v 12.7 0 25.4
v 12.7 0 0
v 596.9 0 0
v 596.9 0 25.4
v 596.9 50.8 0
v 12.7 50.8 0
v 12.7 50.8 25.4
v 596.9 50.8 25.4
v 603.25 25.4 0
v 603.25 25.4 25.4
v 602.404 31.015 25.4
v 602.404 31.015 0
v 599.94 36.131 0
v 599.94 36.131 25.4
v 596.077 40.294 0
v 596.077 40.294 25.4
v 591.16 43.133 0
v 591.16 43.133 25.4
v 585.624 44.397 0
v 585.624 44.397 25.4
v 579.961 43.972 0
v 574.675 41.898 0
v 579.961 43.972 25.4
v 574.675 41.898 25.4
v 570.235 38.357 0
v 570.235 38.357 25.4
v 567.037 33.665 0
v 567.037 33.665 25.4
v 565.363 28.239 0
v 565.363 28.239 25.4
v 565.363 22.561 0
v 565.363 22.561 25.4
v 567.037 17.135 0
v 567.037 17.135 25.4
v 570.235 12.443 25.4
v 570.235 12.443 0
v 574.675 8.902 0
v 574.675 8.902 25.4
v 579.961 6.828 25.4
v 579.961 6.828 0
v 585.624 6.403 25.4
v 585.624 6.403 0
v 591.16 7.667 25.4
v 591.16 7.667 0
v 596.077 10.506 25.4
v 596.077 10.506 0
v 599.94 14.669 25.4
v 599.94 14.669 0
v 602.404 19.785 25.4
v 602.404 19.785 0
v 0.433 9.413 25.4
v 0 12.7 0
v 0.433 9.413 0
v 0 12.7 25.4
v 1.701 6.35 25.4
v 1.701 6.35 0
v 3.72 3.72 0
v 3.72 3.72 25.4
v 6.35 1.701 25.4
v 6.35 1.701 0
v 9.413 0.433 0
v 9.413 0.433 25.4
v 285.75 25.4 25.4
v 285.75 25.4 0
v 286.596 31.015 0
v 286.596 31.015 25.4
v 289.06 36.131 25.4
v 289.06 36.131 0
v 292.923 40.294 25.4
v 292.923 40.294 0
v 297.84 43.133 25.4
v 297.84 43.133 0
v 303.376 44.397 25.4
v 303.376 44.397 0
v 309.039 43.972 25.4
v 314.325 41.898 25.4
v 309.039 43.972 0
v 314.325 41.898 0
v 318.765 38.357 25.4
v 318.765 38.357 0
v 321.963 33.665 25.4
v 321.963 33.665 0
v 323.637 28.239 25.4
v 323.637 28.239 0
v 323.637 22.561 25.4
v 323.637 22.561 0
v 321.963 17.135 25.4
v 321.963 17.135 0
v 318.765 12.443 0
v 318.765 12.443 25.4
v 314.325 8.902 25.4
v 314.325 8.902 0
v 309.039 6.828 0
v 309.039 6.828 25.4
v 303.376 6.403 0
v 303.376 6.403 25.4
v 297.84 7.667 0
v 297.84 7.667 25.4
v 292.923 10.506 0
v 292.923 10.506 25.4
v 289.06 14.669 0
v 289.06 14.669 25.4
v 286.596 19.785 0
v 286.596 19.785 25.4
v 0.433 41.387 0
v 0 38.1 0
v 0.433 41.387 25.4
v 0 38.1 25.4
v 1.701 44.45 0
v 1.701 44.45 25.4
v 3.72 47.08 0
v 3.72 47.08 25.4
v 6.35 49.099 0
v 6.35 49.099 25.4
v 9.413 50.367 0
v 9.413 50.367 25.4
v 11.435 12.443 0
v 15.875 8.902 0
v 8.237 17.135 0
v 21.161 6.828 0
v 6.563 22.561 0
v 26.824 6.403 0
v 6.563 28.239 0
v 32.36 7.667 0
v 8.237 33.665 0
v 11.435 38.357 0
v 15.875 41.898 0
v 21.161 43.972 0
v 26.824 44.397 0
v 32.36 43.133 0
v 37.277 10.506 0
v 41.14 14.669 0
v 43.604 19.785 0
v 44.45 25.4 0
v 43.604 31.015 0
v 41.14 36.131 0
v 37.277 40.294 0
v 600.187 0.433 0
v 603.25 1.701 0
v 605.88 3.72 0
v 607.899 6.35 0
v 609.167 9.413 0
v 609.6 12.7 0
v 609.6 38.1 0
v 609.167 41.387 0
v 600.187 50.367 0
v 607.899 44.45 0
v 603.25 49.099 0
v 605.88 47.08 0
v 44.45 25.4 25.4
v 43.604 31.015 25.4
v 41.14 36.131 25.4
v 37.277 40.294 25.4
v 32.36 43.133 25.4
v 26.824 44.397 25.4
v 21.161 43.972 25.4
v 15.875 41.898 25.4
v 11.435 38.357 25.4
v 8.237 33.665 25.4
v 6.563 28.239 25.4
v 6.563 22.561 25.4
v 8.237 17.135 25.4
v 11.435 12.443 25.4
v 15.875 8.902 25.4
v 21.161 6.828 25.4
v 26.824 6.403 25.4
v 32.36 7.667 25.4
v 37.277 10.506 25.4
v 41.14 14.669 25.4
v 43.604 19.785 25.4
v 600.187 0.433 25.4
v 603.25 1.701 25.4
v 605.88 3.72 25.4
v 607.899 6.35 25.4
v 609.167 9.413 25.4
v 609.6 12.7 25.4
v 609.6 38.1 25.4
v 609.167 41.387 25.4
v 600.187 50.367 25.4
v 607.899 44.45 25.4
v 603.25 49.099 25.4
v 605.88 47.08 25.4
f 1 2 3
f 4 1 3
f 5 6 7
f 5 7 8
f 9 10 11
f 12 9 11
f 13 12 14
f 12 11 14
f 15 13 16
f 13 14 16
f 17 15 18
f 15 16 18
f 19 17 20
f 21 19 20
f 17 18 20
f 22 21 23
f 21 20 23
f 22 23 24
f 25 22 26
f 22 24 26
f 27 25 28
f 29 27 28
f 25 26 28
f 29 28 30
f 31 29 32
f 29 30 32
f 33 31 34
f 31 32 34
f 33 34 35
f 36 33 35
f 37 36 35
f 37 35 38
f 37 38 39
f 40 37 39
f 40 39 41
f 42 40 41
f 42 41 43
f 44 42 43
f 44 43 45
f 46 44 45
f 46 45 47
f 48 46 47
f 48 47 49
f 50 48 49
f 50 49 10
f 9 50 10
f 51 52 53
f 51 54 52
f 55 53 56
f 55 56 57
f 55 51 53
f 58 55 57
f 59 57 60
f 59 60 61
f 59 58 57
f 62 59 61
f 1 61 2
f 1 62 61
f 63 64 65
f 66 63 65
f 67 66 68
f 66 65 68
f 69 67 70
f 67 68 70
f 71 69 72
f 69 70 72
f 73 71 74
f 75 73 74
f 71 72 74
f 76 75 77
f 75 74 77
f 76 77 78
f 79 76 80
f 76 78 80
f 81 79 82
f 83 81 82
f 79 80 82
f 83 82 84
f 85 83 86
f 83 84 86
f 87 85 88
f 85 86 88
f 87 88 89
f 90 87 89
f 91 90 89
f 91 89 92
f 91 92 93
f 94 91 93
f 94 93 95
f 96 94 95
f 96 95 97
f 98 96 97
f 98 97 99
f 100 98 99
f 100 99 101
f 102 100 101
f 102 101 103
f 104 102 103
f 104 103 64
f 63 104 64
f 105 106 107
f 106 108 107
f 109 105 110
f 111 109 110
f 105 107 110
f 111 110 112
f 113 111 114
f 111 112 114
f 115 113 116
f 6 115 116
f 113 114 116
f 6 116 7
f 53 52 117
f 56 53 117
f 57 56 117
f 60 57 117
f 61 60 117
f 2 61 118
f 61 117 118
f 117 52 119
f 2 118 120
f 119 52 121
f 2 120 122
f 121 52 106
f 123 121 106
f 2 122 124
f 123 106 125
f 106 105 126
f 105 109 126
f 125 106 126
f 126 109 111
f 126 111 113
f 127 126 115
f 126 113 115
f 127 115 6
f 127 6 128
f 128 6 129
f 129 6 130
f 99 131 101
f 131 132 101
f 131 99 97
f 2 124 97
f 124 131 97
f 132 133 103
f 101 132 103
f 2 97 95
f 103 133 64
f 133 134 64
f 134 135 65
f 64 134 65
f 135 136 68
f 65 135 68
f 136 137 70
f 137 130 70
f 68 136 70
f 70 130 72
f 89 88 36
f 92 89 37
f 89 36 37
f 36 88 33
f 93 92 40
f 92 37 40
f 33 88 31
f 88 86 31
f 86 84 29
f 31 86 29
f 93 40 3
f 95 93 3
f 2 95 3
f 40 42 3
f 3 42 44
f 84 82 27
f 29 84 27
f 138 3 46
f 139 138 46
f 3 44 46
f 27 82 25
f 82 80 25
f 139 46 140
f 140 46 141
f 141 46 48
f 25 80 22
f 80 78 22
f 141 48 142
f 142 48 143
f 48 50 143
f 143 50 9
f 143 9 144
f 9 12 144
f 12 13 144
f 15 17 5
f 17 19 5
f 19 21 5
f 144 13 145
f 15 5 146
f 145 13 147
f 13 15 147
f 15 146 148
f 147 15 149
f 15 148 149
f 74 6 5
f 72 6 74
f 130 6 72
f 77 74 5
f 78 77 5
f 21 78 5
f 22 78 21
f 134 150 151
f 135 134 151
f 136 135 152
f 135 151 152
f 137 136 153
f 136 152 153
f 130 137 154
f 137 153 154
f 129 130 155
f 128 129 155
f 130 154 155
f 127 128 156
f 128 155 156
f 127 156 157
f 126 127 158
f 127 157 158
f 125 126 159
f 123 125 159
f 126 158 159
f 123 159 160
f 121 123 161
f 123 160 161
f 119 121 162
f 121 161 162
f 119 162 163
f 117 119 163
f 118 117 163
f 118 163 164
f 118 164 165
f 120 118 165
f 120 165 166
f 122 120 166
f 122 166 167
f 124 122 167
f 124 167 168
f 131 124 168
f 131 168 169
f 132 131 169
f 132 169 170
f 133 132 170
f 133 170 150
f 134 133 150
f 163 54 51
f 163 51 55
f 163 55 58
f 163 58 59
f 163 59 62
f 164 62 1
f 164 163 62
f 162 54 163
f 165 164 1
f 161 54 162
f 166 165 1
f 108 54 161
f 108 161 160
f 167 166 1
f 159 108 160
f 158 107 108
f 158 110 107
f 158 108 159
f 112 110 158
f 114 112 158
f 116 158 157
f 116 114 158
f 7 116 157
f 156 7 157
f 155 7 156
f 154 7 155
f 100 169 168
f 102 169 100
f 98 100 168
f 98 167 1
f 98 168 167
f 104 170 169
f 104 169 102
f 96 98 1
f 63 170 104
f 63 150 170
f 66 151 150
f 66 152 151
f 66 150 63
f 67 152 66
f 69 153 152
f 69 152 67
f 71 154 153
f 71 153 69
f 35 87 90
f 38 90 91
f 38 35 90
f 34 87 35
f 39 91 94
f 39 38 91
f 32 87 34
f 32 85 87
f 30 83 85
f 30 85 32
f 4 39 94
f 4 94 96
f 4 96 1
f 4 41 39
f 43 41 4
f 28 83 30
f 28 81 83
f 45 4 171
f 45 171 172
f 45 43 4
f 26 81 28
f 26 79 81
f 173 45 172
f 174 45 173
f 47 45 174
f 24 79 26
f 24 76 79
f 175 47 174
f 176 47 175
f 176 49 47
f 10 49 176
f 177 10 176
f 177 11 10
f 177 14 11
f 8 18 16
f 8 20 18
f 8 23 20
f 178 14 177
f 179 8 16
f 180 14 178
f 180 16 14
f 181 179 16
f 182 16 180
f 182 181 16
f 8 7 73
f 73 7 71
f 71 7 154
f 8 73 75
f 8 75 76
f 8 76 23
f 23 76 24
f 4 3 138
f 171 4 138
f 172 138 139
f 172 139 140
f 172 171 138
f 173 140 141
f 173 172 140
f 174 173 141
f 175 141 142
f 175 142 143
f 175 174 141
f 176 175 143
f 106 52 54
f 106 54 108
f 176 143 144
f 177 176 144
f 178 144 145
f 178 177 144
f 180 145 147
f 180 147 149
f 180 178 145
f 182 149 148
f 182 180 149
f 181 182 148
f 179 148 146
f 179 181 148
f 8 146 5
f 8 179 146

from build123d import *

# Parameters (mm, degrees)
SKETCH1_W           = 609.6
SKETCH1_H           = 50.8
BOSS_EXTRUDE1_DEPTH = 25.4
FILLET1_R           = 12.7
SKETCH4_R           = 19.05
CUT_EXTRUDE1_DEPTH  = 613.240116294
SKETCH5_R           = 19.05
CUT_EXTRUDE2_DEPTH  = 613.240116294
SKETCH2_R           = 19.05
CUT_EXTRUDE3_DEPTH  = 613.240116294


with BuildPart() as part:
    # Sketch1 → Boss-Extrude1 (new body)
    with BuildSketch(Plane.XY):
        with Locations((304.8, 25.4)):
            Rectangle(SKETCH1_W, SKETCH1_H)
    extrude(amount=BOSS_EXTRUDE1_DEPTH)

    # Fillet1
    fillet1_edges = [part.edges().sort_by_distance(p)[0] for p in [
        (0, 50.8, 12.7),
        (609.6, 50.8, 12.7),
        (609.6, 0, 12.7),
        (0, 0, 12.7),
    ]]
    fillet(fillet1_edges, radius=FILLET1_R)

    # Sketch4 → Cut-Extrude1 (cut, through all)
    with BuildSketch(Plane.XY.offset(25.4)):
        with Locations((584.2, 25.4)):
            Circle(SKETCH4_R)
    extrude(amount=-CUT_EXTRUDE1_DEPTH, mode=Mode.SUBTRACT)

    # Sketch5 → Cut-Extrude2 (cut, through all)
    with BuildSketch(Plane(origin=(0, 0, 0), x_dir=(-1, 0, 0), z_dir=(0, 0, -1))):
        with Locations((-304.8, 25.4)):
            Circle(SKETCH5_R)
    extrude(amount=-CUT_EXTRUDE2_DEPTH, mode=Mode.SUBTRACT)

    # Sketch2 → Cut-Extrude3 (cut, through all)
    with BuildSketch(Plane.XY.offset(25.4)):
        with Locations((25.4, 25.4)):
            Circle(SKETCH2_R)
    extrude(amount=-CUT_EXTRUDE3_DEPTH, mode=Mode.SUBTRACT)


solid = part.part
